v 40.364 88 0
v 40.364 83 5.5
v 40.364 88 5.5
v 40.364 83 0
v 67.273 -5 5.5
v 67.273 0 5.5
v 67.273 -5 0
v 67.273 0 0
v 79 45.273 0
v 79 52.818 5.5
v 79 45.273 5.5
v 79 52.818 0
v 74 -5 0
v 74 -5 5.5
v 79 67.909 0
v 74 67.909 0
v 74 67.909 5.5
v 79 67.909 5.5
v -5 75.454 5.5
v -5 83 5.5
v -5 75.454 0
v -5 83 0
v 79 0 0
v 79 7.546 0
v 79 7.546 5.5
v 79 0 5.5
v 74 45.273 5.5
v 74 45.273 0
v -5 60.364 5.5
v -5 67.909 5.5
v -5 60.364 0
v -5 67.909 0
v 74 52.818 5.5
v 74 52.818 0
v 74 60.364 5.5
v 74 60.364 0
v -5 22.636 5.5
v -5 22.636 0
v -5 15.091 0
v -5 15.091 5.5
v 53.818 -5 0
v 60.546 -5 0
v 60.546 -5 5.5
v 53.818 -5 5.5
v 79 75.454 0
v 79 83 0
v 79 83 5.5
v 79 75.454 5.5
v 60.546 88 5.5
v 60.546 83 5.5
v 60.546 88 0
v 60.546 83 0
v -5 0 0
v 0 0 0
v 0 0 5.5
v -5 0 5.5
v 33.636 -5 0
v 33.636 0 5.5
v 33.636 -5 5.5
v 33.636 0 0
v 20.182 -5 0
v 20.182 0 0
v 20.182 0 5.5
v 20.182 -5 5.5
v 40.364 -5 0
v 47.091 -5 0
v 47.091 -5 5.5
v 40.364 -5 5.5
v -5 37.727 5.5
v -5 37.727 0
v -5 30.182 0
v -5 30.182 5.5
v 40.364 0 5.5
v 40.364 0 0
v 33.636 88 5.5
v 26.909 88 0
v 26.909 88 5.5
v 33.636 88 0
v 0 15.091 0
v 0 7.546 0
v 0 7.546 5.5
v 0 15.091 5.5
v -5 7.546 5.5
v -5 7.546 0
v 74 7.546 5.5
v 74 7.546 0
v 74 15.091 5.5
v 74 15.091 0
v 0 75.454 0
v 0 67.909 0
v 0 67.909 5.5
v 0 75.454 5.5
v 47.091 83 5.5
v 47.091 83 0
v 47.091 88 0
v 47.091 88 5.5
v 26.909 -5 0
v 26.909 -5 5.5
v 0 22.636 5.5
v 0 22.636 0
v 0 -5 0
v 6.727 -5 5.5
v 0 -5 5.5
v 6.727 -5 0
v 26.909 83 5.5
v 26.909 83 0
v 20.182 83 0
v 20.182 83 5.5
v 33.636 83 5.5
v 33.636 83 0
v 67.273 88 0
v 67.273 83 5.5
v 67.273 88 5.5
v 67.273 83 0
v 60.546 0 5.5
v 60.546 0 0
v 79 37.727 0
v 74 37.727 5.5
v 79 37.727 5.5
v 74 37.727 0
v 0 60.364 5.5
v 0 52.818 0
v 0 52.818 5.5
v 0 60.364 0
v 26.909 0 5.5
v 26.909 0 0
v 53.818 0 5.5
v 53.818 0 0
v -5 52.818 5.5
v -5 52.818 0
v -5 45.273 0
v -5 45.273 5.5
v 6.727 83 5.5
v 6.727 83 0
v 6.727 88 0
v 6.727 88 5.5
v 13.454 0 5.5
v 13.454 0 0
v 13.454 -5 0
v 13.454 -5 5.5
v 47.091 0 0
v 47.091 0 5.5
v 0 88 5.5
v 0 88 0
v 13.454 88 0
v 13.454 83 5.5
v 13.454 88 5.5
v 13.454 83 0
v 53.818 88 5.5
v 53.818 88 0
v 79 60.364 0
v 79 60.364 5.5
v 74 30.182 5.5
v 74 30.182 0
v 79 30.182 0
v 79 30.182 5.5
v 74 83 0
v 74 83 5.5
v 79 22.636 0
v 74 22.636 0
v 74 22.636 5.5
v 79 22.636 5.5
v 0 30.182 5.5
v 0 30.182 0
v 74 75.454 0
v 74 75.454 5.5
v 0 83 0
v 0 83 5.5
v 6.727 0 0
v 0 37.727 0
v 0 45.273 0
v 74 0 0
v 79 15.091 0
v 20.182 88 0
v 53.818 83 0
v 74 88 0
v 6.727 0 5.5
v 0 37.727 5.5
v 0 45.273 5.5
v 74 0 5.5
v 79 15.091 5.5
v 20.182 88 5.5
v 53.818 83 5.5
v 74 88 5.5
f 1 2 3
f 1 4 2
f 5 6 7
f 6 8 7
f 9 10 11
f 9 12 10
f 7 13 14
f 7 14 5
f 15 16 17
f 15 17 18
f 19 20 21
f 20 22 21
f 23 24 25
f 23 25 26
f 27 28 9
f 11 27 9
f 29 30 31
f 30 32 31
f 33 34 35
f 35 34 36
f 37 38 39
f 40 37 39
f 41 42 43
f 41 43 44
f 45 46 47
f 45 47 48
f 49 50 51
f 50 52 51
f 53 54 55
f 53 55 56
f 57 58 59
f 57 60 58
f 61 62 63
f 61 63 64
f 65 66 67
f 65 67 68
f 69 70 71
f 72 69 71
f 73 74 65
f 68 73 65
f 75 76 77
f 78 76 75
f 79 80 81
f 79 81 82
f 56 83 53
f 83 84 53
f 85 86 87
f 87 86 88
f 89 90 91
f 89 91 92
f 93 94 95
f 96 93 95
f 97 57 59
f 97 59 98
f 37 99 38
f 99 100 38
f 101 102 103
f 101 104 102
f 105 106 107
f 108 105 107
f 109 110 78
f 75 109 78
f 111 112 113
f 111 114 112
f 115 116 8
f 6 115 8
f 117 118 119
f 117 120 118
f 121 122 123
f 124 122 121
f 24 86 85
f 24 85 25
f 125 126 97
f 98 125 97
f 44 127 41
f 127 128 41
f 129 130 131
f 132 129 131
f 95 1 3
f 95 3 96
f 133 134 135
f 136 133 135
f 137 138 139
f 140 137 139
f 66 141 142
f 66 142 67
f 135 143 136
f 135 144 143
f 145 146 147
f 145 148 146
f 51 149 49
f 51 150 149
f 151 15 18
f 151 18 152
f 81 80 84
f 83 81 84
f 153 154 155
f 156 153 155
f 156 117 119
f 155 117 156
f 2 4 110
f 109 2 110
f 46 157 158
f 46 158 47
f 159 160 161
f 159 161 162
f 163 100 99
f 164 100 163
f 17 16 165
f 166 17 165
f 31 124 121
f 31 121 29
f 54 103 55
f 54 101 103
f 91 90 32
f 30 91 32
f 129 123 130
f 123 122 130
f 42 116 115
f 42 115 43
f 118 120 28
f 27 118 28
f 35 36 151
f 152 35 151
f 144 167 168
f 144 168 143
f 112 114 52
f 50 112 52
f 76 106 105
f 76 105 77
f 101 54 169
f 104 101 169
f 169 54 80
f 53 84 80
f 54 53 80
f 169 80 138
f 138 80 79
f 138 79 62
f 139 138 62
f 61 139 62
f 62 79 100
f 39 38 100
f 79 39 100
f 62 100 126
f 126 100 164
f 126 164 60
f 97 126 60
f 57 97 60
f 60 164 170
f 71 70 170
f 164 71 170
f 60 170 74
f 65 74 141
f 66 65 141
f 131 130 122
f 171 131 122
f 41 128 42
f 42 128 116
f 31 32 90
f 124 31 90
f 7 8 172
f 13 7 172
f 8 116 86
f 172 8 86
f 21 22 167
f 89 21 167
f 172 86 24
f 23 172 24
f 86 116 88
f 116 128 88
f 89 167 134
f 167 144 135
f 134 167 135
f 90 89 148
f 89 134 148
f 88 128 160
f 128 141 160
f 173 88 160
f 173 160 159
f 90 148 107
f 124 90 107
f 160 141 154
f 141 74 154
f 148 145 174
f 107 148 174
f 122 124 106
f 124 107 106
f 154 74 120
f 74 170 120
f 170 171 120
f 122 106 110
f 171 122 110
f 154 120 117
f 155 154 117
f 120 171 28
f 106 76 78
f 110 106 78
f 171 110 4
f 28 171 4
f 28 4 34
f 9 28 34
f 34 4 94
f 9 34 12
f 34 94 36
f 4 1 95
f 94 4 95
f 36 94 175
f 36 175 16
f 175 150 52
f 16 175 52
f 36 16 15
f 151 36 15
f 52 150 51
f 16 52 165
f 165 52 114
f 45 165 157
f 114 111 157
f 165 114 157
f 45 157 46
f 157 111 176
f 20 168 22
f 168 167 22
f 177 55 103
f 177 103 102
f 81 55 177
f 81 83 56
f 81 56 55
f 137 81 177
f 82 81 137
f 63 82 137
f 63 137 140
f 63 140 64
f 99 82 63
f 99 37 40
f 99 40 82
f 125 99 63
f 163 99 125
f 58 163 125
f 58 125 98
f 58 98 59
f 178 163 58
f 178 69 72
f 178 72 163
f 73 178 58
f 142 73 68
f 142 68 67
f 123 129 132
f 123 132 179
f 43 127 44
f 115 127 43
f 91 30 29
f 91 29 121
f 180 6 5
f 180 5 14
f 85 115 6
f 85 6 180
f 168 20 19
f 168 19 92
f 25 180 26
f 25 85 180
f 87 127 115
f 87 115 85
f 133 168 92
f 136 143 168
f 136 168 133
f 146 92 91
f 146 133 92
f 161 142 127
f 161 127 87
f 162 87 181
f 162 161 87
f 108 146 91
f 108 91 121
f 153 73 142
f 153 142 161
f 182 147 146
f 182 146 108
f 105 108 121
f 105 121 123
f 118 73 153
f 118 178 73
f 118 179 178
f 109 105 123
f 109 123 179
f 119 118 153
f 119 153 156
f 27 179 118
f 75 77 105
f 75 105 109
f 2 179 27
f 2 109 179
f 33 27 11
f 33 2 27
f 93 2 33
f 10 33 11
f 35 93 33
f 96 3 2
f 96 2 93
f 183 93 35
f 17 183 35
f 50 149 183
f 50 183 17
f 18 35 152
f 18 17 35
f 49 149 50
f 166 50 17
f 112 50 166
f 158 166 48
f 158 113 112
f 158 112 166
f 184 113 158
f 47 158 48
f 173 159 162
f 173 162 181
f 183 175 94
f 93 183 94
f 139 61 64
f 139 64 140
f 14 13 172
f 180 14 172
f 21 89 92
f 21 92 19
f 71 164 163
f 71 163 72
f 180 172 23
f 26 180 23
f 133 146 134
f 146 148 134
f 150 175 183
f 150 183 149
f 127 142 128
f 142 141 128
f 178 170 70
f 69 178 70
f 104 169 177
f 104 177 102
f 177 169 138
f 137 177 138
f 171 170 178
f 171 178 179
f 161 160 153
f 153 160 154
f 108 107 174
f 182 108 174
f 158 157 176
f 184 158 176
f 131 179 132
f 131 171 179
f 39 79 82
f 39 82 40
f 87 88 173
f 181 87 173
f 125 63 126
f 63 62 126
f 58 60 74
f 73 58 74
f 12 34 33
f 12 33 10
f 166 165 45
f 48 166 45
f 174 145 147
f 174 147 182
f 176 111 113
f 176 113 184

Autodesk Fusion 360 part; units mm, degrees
sketch "Sketch1" plane through (0, 0, 0) normal (0, 0, 1) x (1, 0, 0)
  line L0 (0, 0) -> (74, 0)
  line L1 (74, 0) -> (74, 83)
  line L2 (74, 83) -> (0, 83)
  line L3 (0, 83) -> (0, 0)
  dimension "d6" = 74
  dimension "d7" = 83
extrude "Extrude1" add sketch "Sketch1" along normal blind 5
sketch "Sketch2" plane through (0, 0, 0) normal (0, -1, 0) x (1, 0, 0)
  line L0 (0, 0) -> (74, 0)
  line L1 (74, 0) -> (74, 5)
  line L2 (74, 5) -> (0, 5)
  line L3 (0, 5) -> (0, 0)
  line L4 (0, 5) -> (6.7273, 5)
  line L5 (6.7273, 5) -> (6.7273, 0)
  line L6 (6.7273, 0) -> (0, 0)
  line L7 (0, 0) -> (0, 5)
  line L8 (20.1818, 0) -> (13.4545, 0)
  line L9 (13.4545, 0) -> (13.4545, 5)
  line L10 (20.1818, 5) -> (20.1818, 0)
  line L11 (13.4545, 5) -> (20.1818, 5)
  line L12 (33.6364, 0) -> (26.9091, 0)
  line L13 (26.9091, 0) -> (26.9091, 5)
  line L14 (33.6364, 5) -> (33.6364, 0)
  line L15 (26.9091, 5) -> (33.6364, 5)
  line L16 (47.0909, 0) -> (40.3636, 0)
  line L17 (40.3636, 0) -> (40.3636, 5)
  line L18 (47.0909, 5) -> (47.0909, 0)
  line L19 (40.3636, 5) -> (47.0909, 5)
  line L20 (60.5455, 0) -> (53.8182, 0)
  line L21 (53.8182, 0) -> (53.8182, 5)
  line L22 (60.5455, 5) -> (60.5455, 0)
  line L23 (53.8182, 5) -> (60.5455, 5)
  line L24 (74, 0) -> (67.2727, 0)
  line L25 (67.2727, 0) -> (67.2727, 5)
  line L26 (74, 5) -> (74, 0)
  line L27 (67.2727, 5) -> (74, 5)
  dimension "d10" = 6.7273
  dimension "d13" = 67.2727
  dimension "d14" = 0
extrude "Extrude2" add sketch "Sketch2" along normal blind 5 contours L0 L2 L3 L4 L5 L6 L7 | L0 L2 L8 L9 L10 L11 | L0 L2 L12 L13 L14 L15 | L0 L2 L16 L17 L18 L19 | L0 L2 L20 L21 L22 L23 | L0 L1 L2 L24 L25 L26 L27
sketch "Sketch3" plane through (0, 83, 0) normal (0, 1, 0) x (-1, 0, 0)
  line L0 (-74, 0) -> (0, 0)
  line L1 (0, 0) -> (0, 5)
  line L2 (0, 5) -> (-74, 5)
  line L3 (-74, 5) -> (-74, 0)
  line L4 (-74, 5) -> (-67.2727, 5)
  line L5 (-67.2727, 5) -> (-67.2727, 0)
  line L6 (-67.2727, 0) -> (-74, 0)
  line L7 (-74, 0) -> (-74, 5)
  line L8 (-53.8182, 0) -> (-60.5455, 0)
  line L9 (-60.5455, 0) -> (-60.5455, 5)
  line L10 (-53.8182, 5) -> (-53.8182, 0)
  line L11 (-60.5455, 5) -> (-53.8182, 5)
  line L12 (-40.3636, 0) -> (-47.0909, 0)
  line L13 (-47.0909, 0) -> (-47.0909, 5)
  line L14 (-40.3636, 5) -> (-40.3636, 0)
  line L15 (-47.0909, 5) -> (-40.3636, 5)
  line L16 (-26.9091, 0) -> (-33.6364, 0)
  line L17 (-33.6364, 0) -> (-33.6364, 5)
  line L18 (-26.9091, 5) -> (-26.9091, 0)
  line L19 (-33.6364, 5) -> (-26.9091, 5)
  line L20 (-13.4545, 0) -> (-20.1818, 0)
  line L21 (-20.1818, 0) -> (-20.1818, 5)
  line L22 (-13.4545, 5) -> (-13.4545, 0)
  line L23 (-20.1818, 5) -> (-13.4545, 5)
  line L24 (0, 0) -> (-6.7273, 0)
  line L25 (-6.7273, 0) -> (-6.7273, 5)
  line L26 (0, 5) -> (0, 0)
  line L27 (-6.7273, 5) -> (0, 5)
  dimension "d17" = 6.7273
  dimension "d20" = 67.2727
  dimension "d21" = 0
extrude "Extrude3" add sketch "Sketch3" along normal blind 5 contours L0 L2 L3 L4 L5 L6 L7 | L0 L2 L8 L9 L10 L11 | L0 L2 L12 L13 L14 L15 | L0 L2 L16 L17 L18 L19 | L0 L2 L20 L21 L22 L23 | L0 L1 L2 L24 L25 L26 L27
sketch "Sketch4" plane through (0, 0, 0) normal (1, 0, 0) x (0, 1, 0)
  line L0 (0, 0) -> (7.5455, 0)
  line L1 (7.5455, 0) -> (7.5455, 5)
  line L2 (7.5455, 5) -> (0, 5)
  line L3 (0, 5) -> (0, 0)
  line L4 (88, 5) -> (-5, 5)
  line L5 (15.0909, 0) -> (22.6364, 0)
  line L6 (22.6364, 0) -> (22.6364, 5)
  line L7 (22.6364, 5) -> (15.0909, 5)
  line L8 (15.0909, 5) -> (15.0909, 0)
  line L9 (30.1818, 0) -> (37.7273, 0)
  line L10 (37.7273, 0) -> (37.7273, 5)
  line L11 (37.7273, 5) -> (30.1818, 5)
  line L12 (30.1818, 5) -> (30.1818, 0)
  line L13 (45.2727, 0) -> (52.8182, 0)
  line L14 (52.8182, 0) -> (52.8182, 5)
  line L15 (52.8182, 5) -> (45.2727, 5)
  line L16 (45.2727, 5) -> (45.2727, 0)
  line L17 (60.3636, 0) -> (67.9091, 0)
  line L18 (67.9091, 0) -> (67.9091, 5)
  line L19 (67.9091, 5) -> (60.3636, 5)
  line L20 (60.3636, 5) -> (60.3636, 0)
  line L21 (75.4545, 0) -> (83, 0)
  line L22 (83, 0) -> (83, 5)
  line L23 (83, 5) -> (75.4545, 5)
  line L24 (75.4545, 5) -> (75.4545, 0)
  dimension "d24" = 7.5455
  dimension "d27" = 75.4545
  dimension "d28" = 0
extrude "Extrude4" add sketch "Sketch4" against normal blind 5
sketch "Sketch5" plane through (74, 0, 0) normal (1, 0, 0) x (0, 1, 0)
  line L0 (-5, 0) -> (88, 0)
  line L1 (88, 0) -> (88, 5)
  line L2 (88, 5) -> (-5, 5)
  line L3 (-5, 5) -> (-5, 0)
  line L4 (0, 0) -> (7.5455, 0)
  line L5 (7.5455, 0) -> (7.5455, 5)
  line L6 (7.5455, 5) -> (0, 5)
  line L7 (0, 5) -> (0, 0)
  line L8 (15.0909, 0) -> (22.6364, 0)
  line L9 (22.6364, 0) -> (22.6364, 5)
  line L10 (22.6364, 5) -> (15.0909, 5)
  line L11 (15.0909, 5) -> (15.0909, 0)
  line L12 (30.1818, 0) -> (37.7273, 0)
  line L13 (37.7273, 0) -> (37.7273, 5)
  line L14 (37.7273, 5) -> (30.1818, 5)
  line L15 (30.1818, 5) -> (30.1818, 0)
  line L16 (45.2727, 0) -> (52.8182, 0)
  line L17 (52.8182, 0) -> (52.8182, 5)
  line L18 (52.8182, 5) -> (45.2727, 5)
  line L19 (45.2727, 5) -> (45.2727, 0)
  line L20 (60.3636, 0) -> (67.9091, 0)
  line L21 (67.9091, 0) -> (67.9091, 5)
  line L22 (67.9091, 5) -> (60.3636, 5)
  line L23 (60.3636, 5) -> (60.3636, 0)
  line L24 (75.4545, 0) -> (83, 0)
  line L25 (83, 0) -> (83, 5)
  line L26 (83, 5) -> (75.4545, 5)
  line L27 (75.4545, 5) -> (75.4545, 0)
  dimension "d31" = 7.5455
  dimension "d34" = 75.4545
  dimension "d35" = 0
extrude "Extrude5" add sketch "Sketch5" along normal blind 5 contours L0 L2 L4 L5 L6 L7 | L0 L2 L8 L9 L10 L11 | L0 L2 L12 L13 L14 L15 | L0 L2 L16 L17 L18 L19 | L0 L2 L20 L21 L22 L23 | L0 L2 L24 L25 L26 L27
extrude "Extrude6" add 1 faces at (38.1212, 25.1515, 5) along direction (0, 0, 1) blind 0.5
sketch "Sketch6" plane through (79, 0, 0) normal (1, 0, 0) x (0, 1, 0)
  line L0 (75.4545, 5.5) -> (75.4545, 0)
  line L1 (75.4545, 0) -> (83, 0)
  line L2 (83, 0) -> (83, 5.5)
  line L3 (83, 5.5) -> (75.4545, 5.5)
sketch "Sketch7" plane through (0, 0, 0) normal (0, 0, 1) x (1, 0, 0)
  line L0 (79, 75.4545) -> (79, 83) construction
  line L1 (79, 83) -> (91, 83) construction
  line L2 (91, 83) -> (101, 83)
  line L3 (101, 83) -> (101, -6)
  line L4 (101, -6) -> (91, -6)
  line L5 (91, -6) -> (91, 83)
  line L6 (91, 83) -> (101, 83)
  line L7 (101, 83) -> (101, 89)
  line L8 (101, 89) -> (91, 89)
  line L9 (91, 89) -> (91, 83)
  line L10 (91, 83) -> (85, 83)
  line L11 (85, 83) -> (85, 89)
  line L12 (85, 89) -> (91, 89)
  line L13 (91, 89) -> (91, 83)
  line L14 (91, -6) -> (85, -6)
  line L15 (85, -6) -> (85, 0)
  line L16 (85, 0) -> (91, 0)
  line L17 (91, 0) -> (91, -6)
  point P0 (79, 83)
  dimension "d40" = 12
  dimension "d41" = 89
  dimension "d42" = 10
  dimension "d43" = 6
  dimension "d44" = 6
  dimension "d45" = 6
  dimension "d46" = 6
  dimension "d47" = 6
sketch "Sketch8" plane through (91, 0, 0) normal (-1, 0, 0) x (0, -1, 0)
  line L0 (-82, 0) -> (0, 0)
  line L1 (0, 0) -> (0, 6.5)
  line L2 (0, 6.5) -> (-82, 6.5)
  line L3 (-82, 6.5) -> (-82, 0)
  line L4 (-74.4545, 6.5) -> (-66.9091, 6.5)
  line L5 (-66.9091, 6.5) -> (-66.9091, 0)
  line L6 (-66.9091, 0) -> (-74.4545, 0)
  line L7 (-74.4545, 0) -> (-74.4545, 6.5)
  line L8 (-51.8182, 0) -> (-59.3636, 0)
  line L9 (-59.3636, 0) -> (-59.3636, 6.5)
  line L10 (-51.8182, 6.5) -> (-51.8182, 0)
  line L11 (-59.3636, 6.5) -> (-51.8182, 6.5)
  line L12 (-36.7273, 0) -> (-44.2727, 0)
  line L13 (-44.2727, 0) -> (-44.2727, 6.5)
  line L14 (-36.7273, 6.5) -> (-36.7273, 0)
  line L15 (-44.2727, 6.5) -> (-36.7273, 6.5)
  line L16 (-21.6364, 0) -> (-29.1818, 0)
  line L17 (-29.1818, 0) -> (-29.1818, 6.5)
  line L18 (-21.6364, 6.5) -> (-21.6364, 0)
  line L19 (-29.1818, 6.5) -> (-21.6364, 6.5)
  line L20 (-6.5455, 0) -> (-14.0909, 0)
  line L21 (-14.0909, 0) -> (-14.0909, 6.5)
  line L22 (-6.5455, 6.5) -> (-6.5455, 0)
  line L23 (-14.0909, 6.5) -> (-6.5455, 6.5)
  dimension "d50" = 7.5455
  dimension "d51" = 7.5455
  dimension "d54" = 60.3636
  dimension "d55" = 0
sketch "Sketch9" plane through (0, 0, 0) normal (0, 0, 1) x (1, 0, 0)
equation "paksus = 5 mm"
equation "laius = 74 mm"
equation "pikkus = 83 mm"
equation "laius_tapp = laius / 11"
equation "pikkus_tapp = pikkus / 11"
equation "d6 = laius"
equation "d7 = pikkus"
equation "d8 = paksus"
equation "d10 = laius_tapp"
equation "d13 = laius - laius_tapp"
equation "d15 = paksus"
equation "d17 = laius_tapp"
equation "d20 = laius - laius_tapp"
equation "d22 = paksus"
equation "d24 = pikkus_tapp"
equation "d27 = pikkus - pikkus_tapp"
equation "d29 = -paksus"
equation "d31 = pikkus_tapp"
equation "d34 = pikkus - pikkus_tapp"
equation "d36 = paksus"
equation "d41 = pikkus + 6 mm"
equation "d50 = pikkus_tapp"
equation "d51 = pikkus_tapp"
equation "d54 = pikkus - pikkus_tapp * 3"
